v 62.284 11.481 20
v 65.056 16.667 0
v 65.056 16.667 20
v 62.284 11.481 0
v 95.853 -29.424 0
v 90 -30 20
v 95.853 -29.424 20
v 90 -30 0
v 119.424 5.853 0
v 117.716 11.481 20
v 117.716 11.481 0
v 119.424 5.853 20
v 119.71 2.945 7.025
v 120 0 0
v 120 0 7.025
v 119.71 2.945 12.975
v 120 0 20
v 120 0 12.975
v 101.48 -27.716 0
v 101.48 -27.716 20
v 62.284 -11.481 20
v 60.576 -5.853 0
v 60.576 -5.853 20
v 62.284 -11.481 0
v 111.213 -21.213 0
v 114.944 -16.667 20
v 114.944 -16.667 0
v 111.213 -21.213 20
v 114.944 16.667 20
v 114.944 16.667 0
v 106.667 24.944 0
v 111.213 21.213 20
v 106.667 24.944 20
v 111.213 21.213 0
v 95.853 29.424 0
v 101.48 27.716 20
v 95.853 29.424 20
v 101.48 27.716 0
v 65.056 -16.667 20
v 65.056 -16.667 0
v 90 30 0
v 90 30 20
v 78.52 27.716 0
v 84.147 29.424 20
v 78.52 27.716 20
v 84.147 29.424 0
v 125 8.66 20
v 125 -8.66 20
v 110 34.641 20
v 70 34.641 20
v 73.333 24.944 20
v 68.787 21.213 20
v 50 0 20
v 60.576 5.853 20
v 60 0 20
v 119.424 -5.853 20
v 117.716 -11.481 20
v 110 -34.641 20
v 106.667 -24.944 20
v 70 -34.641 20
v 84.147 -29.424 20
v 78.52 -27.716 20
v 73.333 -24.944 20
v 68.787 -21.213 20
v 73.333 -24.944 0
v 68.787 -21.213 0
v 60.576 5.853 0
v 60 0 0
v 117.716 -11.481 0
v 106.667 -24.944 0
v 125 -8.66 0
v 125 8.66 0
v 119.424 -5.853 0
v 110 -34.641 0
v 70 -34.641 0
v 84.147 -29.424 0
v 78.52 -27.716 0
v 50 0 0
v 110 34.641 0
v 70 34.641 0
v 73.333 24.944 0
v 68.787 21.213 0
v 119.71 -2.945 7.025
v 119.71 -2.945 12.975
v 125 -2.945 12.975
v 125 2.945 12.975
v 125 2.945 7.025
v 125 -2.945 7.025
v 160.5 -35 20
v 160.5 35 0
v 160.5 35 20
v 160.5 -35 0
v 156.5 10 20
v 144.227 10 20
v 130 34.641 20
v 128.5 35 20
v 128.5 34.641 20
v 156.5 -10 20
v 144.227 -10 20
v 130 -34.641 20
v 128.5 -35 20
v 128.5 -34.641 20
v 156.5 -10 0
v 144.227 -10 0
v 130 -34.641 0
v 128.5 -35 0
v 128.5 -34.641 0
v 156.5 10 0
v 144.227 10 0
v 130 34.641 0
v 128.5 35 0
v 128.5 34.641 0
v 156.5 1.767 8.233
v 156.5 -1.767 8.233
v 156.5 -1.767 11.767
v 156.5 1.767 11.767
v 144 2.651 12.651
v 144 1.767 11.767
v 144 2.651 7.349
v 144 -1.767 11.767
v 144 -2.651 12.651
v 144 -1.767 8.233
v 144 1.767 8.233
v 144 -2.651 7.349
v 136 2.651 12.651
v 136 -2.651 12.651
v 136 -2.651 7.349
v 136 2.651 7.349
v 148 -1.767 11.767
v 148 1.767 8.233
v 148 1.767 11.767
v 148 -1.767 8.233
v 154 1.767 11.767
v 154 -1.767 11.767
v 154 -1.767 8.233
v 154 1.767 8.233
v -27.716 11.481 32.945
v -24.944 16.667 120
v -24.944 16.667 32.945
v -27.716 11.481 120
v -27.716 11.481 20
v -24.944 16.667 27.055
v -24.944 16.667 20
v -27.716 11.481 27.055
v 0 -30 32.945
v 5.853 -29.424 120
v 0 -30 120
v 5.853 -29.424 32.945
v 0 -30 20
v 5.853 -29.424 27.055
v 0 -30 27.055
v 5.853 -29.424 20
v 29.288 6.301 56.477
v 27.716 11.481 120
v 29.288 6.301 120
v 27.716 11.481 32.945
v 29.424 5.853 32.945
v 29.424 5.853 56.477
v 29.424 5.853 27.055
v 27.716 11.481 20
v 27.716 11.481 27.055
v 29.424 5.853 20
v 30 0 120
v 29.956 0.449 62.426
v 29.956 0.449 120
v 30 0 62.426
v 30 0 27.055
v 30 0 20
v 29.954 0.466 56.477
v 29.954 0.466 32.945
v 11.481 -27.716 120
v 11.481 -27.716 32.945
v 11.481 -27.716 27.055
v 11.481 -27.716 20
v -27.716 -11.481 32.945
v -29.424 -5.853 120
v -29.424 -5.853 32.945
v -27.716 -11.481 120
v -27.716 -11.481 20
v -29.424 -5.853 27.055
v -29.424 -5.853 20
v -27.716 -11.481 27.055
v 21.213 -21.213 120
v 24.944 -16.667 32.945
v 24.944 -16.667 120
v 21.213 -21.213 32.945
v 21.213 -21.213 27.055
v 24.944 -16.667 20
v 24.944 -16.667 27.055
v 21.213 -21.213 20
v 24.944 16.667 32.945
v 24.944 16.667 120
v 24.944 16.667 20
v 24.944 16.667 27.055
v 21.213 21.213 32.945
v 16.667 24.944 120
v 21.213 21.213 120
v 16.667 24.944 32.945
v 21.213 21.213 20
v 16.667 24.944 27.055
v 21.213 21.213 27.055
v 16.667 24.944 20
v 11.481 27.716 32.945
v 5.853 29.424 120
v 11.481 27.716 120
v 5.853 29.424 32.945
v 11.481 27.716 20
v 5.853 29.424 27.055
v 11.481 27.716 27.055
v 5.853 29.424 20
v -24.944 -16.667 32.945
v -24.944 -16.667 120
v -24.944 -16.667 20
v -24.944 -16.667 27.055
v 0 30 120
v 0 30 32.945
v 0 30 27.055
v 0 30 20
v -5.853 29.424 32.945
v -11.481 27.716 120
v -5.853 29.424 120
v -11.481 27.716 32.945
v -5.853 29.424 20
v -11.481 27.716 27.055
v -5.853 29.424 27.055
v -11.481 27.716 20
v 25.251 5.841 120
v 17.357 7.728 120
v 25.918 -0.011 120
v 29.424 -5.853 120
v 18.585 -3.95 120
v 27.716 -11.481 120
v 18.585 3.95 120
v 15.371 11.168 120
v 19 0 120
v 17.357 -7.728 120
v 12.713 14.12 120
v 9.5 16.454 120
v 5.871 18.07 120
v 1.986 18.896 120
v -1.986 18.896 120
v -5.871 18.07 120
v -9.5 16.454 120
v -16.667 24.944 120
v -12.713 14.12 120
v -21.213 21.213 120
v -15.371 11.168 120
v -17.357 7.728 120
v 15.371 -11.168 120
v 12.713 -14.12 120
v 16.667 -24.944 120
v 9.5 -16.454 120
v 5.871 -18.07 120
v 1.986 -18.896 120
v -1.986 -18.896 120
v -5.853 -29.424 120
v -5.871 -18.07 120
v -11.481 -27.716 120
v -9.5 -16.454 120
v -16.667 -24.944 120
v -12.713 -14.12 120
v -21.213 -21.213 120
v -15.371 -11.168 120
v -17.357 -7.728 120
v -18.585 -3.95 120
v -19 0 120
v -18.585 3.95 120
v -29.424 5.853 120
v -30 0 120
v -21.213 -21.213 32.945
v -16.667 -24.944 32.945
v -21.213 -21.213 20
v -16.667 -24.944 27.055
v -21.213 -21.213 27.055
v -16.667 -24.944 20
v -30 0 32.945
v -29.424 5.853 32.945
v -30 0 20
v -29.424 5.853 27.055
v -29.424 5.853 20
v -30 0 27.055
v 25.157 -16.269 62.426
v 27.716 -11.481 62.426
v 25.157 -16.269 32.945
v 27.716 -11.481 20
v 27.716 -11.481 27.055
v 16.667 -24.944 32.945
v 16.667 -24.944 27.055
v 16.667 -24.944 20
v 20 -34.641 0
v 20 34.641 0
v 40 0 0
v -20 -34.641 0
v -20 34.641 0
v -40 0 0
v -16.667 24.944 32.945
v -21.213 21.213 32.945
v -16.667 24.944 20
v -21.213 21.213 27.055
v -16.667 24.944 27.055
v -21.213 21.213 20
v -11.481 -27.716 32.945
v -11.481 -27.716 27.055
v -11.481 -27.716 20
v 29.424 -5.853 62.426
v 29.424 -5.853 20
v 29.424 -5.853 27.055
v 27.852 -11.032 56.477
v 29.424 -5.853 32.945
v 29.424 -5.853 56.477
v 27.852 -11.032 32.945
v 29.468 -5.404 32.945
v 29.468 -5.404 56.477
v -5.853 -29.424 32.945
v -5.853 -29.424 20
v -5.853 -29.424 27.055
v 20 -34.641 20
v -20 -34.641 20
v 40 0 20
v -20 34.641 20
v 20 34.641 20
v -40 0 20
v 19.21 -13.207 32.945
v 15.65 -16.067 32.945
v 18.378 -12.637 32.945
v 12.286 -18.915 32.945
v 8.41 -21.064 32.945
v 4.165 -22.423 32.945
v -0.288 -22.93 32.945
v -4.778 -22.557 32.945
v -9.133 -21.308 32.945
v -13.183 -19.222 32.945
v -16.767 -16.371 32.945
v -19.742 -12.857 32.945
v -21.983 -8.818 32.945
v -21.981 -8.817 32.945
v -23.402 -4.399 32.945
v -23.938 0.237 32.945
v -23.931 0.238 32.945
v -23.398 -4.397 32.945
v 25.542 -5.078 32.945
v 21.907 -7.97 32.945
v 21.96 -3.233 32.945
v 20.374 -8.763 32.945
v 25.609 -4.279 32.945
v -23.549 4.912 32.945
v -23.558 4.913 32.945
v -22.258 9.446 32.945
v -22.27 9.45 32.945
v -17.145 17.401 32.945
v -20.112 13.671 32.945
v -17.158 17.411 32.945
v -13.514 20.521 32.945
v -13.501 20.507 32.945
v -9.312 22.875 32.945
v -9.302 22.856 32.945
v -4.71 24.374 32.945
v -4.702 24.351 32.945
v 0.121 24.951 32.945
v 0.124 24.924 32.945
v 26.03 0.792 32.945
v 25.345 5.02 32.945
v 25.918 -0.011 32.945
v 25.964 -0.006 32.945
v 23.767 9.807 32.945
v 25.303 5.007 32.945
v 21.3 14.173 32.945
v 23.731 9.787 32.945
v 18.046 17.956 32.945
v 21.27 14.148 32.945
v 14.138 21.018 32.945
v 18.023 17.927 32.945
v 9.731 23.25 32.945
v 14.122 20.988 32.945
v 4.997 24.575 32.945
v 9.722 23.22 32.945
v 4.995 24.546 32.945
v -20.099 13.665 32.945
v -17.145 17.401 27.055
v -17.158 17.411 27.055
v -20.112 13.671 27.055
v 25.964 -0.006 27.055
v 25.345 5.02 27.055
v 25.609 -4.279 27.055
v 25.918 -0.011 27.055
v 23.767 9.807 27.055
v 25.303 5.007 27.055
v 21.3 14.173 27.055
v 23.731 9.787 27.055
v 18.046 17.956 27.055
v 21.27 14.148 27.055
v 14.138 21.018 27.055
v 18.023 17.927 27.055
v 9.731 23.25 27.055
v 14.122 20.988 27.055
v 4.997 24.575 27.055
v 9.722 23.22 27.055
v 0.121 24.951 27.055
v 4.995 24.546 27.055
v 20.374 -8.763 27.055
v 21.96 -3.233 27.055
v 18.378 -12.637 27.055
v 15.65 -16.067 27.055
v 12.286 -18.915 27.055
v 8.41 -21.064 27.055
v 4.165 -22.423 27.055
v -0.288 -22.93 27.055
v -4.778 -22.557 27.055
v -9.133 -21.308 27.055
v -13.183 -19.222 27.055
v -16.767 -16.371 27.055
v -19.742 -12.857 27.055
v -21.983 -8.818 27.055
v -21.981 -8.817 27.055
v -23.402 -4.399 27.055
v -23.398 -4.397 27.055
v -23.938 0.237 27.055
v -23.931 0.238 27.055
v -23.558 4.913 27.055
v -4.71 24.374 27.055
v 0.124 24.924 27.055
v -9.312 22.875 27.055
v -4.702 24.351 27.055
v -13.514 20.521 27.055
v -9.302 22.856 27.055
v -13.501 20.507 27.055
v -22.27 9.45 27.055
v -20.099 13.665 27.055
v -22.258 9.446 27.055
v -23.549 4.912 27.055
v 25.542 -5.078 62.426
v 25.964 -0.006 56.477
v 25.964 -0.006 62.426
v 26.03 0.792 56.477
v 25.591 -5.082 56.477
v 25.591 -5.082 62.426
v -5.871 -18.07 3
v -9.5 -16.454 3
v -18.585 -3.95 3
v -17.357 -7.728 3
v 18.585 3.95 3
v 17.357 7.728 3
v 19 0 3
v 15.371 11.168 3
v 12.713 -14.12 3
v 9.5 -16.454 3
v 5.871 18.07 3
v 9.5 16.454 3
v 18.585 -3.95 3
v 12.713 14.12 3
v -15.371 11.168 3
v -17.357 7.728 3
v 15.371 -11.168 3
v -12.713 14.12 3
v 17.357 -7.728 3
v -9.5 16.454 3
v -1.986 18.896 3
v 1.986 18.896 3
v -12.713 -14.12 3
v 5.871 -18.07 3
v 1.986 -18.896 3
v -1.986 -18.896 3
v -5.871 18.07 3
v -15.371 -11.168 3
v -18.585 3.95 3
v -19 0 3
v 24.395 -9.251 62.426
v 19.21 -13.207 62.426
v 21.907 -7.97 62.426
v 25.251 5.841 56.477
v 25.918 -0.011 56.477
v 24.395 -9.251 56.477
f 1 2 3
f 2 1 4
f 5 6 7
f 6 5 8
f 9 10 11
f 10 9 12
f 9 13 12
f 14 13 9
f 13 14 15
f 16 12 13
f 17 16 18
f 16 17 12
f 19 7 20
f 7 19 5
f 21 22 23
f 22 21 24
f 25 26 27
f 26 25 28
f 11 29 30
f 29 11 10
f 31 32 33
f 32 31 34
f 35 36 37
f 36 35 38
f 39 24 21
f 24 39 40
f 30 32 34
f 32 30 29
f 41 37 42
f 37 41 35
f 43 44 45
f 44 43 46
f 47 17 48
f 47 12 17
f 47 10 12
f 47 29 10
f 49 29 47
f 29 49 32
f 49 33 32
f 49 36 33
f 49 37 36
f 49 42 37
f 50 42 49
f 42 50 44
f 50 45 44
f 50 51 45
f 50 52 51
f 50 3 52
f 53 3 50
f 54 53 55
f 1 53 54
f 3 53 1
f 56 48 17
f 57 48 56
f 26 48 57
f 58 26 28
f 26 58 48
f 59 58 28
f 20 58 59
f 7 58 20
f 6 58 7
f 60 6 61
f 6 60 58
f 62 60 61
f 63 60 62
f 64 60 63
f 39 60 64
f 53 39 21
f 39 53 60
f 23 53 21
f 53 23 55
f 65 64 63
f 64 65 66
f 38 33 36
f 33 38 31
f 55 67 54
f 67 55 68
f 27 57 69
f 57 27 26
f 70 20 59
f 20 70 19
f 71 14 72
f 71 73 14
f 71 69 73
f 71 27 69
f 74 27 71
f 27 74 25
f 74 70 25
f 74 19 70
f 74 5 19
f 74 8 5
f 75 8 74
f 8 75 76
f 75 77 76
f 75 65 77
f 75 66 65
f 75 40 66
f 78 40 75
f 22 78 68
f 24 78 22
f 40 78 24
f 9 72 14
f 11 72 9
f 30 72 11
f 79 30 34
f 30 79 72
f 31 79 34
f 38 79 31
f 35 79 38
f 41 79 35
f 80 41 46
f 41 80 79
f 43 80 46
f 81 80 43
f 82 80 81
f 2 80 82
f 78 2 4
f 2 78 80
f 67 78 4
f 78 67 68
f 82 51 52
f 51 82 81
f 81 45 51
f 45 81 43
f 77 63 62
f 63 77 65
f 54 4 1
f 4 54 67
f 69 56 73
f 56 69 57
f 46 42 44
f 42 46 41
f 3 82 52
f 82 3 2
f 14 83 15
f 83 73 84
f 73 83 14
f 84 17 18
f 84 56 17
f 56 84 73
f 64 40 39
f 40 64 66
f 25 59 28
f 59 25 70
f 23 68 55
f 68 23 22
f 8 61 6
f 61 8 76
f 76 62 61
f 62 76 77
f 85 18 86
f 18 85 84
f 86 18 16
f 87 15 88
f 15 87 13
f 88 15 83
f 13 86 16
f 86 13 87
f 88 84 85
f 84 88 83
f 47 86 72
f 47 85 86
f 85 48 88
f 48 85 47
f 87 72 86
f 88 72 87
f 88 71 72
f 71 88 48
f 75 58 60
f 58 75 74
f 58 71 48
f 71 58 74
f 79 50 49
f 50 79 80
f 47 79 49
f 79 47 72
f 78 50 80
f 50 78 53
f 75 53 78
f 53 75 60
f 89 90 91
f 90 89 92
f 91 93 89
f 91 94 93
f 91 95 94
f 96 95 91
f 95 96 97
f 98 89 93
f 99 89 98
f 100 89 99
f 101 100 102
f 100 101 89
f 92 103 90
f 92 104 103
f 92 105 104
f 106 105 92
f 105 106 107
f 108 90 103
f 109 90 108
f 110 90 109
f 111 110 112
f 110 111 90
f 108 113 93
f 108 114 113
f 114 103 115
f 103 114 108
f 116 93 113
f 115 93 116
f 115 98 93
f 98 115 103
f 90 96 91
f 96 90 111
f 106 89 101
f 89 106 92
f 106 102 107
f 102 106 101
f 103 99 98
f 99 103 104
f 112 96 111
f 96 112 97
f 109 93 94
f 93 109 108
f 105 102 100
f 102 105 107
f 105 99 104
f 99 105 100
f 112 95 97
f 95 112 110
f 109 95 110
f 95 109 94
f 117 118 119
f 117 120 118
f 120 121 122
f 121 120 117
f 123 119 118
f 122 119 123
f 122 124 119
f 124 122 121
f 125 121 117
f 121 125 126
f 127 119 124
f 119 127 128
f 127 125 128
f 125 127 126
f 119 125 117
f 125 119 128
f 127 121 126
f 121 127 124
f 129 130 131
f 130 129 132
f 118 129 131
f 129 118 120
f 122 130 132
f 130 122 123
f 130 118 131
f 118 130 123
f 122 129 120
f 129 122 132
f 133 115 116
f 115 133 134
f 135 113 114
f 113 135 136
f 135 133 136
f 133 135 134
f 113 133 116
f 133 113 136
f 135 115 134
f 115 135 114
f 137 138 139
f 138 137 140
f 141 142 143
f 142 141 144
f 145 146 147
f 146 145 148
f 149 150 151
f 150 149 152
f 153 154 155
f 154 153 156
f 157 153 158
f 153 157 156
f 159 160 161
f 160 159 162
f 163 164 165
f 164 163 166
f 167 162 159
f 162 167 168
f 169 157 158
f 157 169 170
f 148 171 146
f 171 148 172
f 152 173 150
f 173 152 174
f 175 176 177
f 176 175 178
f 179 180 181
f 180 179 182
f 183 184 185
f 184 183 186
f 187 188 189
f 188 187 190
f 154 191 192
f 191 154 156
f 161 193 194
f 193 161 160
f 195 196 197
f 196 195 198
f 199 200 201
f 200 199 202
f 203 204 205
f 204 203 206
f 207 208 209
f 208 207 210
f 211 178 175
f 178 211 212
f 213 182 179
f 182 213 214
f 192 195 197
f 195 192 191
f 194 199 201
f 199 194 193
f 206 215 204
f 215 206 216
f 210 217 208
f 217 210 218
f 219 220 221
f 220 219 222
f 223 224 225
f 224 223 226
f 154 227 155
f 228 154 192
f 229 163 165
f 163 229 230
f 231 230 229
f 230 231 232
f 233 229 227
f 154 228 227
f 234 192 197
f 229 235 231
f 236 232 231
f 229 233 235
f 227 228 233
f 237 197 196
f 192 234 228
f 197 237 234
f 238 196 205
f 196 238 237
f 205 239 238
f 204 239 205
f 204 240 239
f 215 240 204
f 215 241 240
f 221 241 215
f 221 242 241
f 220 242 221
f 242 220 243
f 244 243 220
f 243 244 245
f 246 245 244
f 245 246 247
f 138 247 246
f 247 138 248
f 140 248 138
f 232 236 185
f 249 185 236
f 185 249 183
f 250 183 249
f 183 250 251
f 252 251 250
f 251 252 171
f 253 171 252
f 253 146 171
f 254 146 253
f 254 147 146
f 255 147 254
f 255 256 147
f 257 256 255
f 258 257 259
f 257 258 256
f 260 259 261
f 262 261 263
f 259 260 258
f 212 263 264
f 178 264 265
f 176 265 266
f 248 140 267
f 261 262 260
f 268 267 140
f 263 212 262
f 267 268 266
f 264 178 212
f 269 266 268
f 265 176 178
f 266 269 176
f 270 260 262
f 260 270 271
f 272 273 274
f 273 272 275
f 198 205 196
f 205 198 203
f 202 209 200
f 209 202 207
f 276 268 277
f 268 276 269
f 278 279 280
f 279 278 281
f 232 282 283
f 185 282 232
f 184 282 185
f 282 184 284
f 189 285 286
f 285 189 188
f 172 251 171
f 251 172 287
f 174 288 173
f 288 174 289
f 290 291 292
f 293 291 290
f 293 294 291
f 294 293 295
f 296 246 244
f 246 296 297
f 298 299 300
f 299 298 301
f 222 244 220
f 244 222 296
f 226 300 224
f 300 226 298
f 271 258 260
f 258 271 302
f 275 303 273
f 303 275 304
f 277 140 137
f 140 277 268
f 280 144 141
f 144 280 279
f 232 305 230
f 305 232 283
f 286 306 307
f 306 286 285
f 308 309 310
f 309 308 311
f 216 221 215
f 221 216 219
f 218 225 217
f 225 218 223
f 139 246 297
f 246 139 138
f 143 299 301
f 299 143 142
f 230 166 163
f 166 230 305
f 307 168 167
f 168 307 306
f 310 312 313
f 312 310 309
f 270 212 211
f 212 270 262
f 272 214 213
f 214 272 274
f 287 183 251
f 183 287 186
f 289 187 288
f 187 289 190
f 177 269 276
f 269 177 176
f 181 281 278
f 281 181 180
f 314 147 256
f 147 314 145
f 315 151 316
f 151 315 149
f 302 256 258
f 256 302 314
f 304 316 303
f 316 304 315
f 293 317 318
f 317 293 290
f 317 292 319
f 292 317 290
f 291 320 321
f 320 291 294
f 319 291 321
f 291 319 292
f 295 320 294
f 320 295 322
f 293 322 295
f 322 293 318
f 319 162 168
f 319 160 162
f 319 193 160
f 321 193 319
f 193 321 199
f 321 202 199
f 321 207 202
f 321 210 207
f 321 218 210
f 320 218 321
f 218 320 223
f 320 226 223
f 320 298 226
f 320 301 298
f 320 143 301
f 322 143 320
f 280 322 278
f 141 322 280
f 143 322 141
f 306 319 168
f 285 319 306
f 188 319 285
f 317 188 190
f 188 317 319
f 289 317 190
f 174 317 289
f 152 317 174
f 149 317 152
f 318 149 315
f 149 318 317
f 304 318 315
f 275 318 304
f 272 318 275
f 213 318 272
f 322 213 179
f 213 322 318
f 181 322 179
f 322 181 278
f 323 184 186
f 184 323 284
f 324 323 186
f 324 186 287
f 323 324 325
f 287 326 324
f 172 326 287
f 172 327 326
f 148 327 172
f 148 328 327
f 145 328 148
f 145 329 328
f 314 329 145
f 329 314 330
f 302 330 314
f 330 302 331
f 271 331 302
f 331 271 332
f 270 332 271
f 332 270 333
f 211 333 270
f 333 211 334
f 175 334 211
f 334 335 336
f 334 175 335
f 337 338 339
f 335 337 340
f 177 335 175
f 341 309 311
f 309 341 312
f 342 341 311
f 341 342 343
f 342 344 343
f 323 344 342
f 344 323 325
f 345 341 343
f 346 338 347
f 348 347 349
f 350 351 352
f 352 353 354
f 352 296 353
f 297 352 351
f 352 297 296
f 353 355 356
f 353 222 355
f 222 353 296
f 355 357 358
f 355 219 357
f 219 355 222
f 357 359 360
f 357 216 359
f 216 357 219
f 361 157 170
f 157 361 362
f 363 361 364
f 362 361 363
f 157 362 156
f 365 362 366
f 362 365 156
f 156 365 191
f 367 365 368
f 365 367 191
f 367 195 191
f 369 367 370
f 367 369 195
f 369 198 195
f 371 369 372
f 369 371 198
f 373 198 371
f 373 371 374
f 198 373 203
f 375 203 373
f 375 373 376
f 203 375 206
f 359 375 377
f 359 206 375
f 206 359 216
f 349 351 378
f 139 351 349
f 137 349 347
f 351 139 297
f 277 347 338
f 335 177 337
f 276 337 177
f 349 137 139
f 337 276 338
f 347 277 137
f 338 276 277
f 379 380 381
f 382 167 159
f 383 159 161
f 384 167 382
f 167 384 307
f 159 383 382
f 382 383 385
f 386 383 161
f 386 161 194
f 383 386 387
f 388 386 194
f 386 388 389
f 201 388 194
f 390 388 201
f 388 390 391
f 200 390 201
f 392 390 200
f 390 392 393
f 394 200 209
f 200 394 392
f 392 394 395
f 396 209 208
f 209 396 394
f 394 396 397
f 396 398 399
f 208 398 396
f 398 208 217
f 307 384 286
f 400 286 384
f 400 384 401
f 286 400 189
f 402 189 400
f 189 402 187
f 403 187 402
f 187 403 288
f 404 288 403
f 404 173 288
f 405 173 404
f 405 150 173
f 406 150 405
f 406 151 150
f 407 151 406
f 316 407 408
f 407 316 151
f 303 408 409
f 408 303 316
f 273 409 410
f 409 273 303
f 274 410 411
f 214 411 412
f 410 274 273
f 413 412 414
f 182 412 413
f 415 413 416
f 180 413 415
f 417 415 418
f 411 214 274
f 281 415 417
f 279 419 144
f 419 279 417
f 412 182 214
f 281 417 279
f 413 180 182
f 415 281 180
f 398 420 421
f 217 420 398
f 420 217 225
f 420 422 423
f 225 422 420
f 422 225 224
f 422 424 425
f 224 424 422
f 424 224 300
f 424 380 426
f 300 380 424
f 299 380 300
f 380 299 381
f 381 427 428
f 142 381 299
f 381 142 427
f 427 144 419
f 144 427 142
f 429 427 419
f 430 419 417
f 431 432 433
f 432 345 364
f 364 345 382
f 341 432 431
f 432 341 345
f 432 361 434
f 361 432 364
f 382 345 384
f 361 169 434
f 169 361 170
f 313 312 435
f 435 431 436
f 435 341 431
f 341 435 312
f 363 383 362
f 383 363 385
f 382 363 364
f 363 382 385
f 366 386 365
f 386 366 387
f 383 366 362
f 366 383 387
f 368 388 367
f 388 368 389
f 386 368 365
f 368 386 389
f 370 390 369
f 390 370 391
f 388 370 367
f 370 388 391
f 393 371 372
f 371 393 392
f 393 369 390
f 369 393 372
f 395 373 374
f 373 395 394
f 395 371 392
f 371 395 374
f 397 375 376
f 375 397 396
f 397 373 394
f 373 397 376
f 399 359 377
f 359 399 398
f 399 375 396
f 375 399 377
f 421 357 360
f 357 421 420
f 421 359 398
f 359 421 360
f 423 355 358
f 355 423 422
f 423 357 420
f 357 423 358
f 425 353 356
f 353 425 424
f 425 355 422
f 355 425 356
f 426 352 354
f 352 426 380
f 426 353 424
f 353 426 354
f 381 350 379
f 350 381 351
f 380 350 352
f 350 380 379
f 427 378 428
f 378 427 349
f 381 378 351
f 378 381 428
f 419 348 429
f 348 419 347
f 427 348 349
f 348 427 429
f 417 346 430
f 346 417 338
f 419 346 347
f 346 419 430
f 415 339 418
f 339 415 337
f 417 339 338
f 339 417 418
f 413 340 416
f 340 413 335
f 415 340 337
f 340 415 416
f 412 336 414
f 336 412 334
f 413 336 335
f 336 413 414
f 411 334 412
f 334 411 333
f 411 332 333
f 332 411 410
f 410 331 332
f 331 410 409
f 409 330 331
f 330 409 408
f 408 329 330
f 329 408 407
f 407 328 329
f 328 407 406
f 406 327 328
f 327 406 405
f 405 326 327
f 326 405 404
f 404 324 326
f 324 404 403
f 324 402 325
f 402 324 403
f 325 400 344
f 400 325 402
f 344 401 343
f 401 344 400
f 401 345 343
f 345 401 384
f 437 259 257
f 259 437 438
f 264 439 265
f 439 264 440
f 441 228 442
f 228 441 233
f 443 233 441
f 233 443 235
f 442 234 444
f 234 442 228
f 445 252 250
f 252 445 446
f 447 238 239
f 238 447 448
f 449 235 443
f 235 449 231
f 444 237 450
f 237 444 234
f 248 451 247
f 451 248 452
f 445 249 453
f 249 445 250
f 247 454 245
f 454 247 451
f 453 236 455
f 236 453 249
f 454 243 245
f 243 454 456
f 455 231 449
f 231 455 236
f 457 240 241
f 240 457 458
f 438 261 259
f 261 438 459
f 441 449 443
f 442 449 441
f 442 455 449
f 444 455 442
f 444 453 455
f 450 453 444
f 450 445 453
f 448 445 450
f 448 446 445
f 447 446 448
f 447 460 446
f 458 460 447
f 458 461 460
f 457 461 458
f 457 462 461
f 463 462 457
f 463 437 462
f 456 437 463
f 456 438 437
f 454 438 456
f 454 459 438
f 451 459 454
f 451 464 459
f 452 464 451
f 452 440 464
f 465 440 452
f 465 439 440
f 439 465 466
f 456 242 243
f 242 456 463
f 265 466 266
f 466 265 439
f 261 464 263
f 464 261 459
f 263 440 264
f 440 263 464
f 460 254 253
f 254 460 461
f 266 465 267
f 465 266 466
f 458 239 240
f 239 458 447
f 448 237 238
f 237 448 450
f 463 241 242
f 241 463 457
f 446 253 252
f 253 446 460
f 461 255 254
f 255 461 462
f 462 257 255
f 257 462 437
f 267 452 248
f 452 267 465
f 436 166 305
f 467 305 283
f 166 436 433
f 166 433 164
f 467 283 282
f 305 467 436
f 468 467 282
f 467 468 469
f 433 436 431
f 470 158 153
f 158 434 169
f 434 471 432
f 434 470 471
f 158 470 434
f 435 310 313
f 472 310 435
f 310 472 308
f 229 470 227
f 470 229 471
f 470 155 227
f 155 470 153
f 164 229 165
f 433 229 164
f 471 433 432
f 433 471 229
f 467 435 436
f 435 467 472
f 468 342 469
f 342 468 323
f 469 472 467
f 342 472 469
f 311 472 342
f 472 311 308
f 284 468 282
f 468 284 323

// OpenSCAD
pin_height = 4;
cylinder_radius = 30;


base_radius = cylinder_radius + 10;

maze_radius = cylinder_radius - pin_height;
trap_radius = cylinder_radius - 2*pin_height;


bottom_height = 20;
cylinder_height = 100;


cylinder_thikness = 3;


reset_curve_elements = 32;


side_lenght =  (2*3.1415*cylinder_radius)/ reset_curve_elements;


module cell(position_x,position_y,depth){
    rotate([0,0,position_x * (360/reset_curve_elements) - reset_curve_elements/2]) 
    translate([cylinder_radius - depth,0, bottom_height+10 + position_y * side_lenght]) 
    cube([pin_height*2 + position_x*pin_height*2/reset_curve_elements, side_lenght, side_lenght*1.01], center=true);
}

//rotating part

translate([90,0,0]){
    color ("orange")
    union(){
    difference()
    { 
        union(){
           cylinder(r = base_radius, h = bottom_height,$fn=6); 
        }
        union(){
            cylinder(r = cylinder_radius, h = bottom_height,$fn=32);    
            translate([cylinder_radius,0,bottom_height/2])
    cube([pin_height*10, side_lenght, side_lenght*1.01], center=true);
            translate([base_radius,0,bottom_height/2])
    cube([10, side_lenght*10, side_lenght*10], center=true); 
        }
    }
}
    

translate([20,0,0]){
    difference(){
        union(){
    
    translate([cylinder_radius+pin_height*1.5+12.5,0,bottom_height/2])
    cube([4, 70, 20], center=true);
    
    mirror([0,1,0])
    translate([cylinder_radius+pin_height*1.5-2.5,22.5,bottom_height/2])
    cube([30, 25, 20], center=true);
    translate([cylinder_radius+pin_height*1.5-2.5,22.5,bottom_height/2])
    cube([30, 25, 20], center=true);
    
    /*
    translate([0,10,10])
    rotate([90,0,0])
    difference(){
    translate([cylinder_radius+pin_height*1.5,0,bottom_height/2])
    translate([1,-7.5,0])
    linear_extrude(height = 2, center = true, convexity = 10)
    resize([8,15])
    import (file = "spring.dxf");
        translate([cylinder_radius+pin_height*1.5,0,bottom_height/2])
    translate([2.6,-6,0])
    linear_extrude(height = 2, center = true, convexity = 10)
    resize([5,12])
    import (file = "spring.dxf");
    }*/
    }

    cylinder(r = base_radius, h = bottom_height,$fn=6);
}

//pin intself
    translate([cylinder_radius,0,bottom_height/2])
    cube([pin_height*2, side_lenght*0.9, side_lenght*0.9], center=true);
    //pin connection
    translate([cylinder_radius+pin_height*1.5,0,bottom_height/2])
    cube([pin_height, side_lenght*0.6, side_lenght*0.6], center=true);
    
    //spring
    difference(){
    translate([cylinder_radius+pin_height*1.5,0,bottom_height/2])
    translate([1,-7.5,0])
    linear_extrude(height = 2, center = true, convexity = 10)
    resize([8,15])
    import (file = "spring.dxf");
        translate([cylinder_radius+pin_height*1.5,0,bottom_height/2])
    translate([2.6,-6,0])
    linear_extrude(height = 2, center = true, convexity = 10)
    resize([5,12])
    import (file = "spring.dxf");
    }
    
    translate([cylinder_radius+pin_height*1.5+10,0,bottom_height/2])
    cube([pin_height, side_lenght*0.6, side_lenght*0.6], center=true);
}
    
}






//central piece
difference(){
    union(){
        cylinder(r = cylinder_radius, h = bottom_height + cylinder_height,$fn=32);
        
        
        //cylinder base
        cylinder(r = base_radius, h = bottom_height,$fn=6);
             
    }
    
    union(){
        translate([0,0,cylinder_thikness]) cylinder(r = trap_radius-cylinder_thikness, h = bottom_height + cylinder_height - cylinder_thikness);
        
        //reset section
        for(i=[0:reset_curve_elements]){
        rotate([0,0,i * (360/reset_curve_elements) - reset_curve_elements/2]) 
            translate([cylinder_radius,0, bottom_height+10])            cube([pin_height*2 + i*pin_height*2/reset_curve_elements, side_lenght, side_lenght], center=true);
        }
        
        //rotate([0,0,(360/reset_curve_elements)]) translate([cylinder_radius,0, bottom_height+10]) cube([pin_height*2, pin_height, pin_height*4], center=true);
        cell(1,1,0);
        cell(1,2,0);
        cell(1,3,0);
        cell(1,4,0);
        cell(1,5,0);
        cell(2,5,0);
        cell(0,5,0);
        cell(-1,5,3);
        cell(-1,4,3);
        cell(-1,3,3);
        cell(-1,2,3);
        cell(-1,1,3);
        
        cell(2,5,0);
        cell(2,6,0);
        cell(2,7,0);
        cell(2,8,0);
        cell(2,9,0);
        cell(2,10,0);
        cell(2,11,0);
        cell(2,12,0);
        cell(2,13,0);
        cell(2,14,0);
        cell(2,15,0);
    }

}
